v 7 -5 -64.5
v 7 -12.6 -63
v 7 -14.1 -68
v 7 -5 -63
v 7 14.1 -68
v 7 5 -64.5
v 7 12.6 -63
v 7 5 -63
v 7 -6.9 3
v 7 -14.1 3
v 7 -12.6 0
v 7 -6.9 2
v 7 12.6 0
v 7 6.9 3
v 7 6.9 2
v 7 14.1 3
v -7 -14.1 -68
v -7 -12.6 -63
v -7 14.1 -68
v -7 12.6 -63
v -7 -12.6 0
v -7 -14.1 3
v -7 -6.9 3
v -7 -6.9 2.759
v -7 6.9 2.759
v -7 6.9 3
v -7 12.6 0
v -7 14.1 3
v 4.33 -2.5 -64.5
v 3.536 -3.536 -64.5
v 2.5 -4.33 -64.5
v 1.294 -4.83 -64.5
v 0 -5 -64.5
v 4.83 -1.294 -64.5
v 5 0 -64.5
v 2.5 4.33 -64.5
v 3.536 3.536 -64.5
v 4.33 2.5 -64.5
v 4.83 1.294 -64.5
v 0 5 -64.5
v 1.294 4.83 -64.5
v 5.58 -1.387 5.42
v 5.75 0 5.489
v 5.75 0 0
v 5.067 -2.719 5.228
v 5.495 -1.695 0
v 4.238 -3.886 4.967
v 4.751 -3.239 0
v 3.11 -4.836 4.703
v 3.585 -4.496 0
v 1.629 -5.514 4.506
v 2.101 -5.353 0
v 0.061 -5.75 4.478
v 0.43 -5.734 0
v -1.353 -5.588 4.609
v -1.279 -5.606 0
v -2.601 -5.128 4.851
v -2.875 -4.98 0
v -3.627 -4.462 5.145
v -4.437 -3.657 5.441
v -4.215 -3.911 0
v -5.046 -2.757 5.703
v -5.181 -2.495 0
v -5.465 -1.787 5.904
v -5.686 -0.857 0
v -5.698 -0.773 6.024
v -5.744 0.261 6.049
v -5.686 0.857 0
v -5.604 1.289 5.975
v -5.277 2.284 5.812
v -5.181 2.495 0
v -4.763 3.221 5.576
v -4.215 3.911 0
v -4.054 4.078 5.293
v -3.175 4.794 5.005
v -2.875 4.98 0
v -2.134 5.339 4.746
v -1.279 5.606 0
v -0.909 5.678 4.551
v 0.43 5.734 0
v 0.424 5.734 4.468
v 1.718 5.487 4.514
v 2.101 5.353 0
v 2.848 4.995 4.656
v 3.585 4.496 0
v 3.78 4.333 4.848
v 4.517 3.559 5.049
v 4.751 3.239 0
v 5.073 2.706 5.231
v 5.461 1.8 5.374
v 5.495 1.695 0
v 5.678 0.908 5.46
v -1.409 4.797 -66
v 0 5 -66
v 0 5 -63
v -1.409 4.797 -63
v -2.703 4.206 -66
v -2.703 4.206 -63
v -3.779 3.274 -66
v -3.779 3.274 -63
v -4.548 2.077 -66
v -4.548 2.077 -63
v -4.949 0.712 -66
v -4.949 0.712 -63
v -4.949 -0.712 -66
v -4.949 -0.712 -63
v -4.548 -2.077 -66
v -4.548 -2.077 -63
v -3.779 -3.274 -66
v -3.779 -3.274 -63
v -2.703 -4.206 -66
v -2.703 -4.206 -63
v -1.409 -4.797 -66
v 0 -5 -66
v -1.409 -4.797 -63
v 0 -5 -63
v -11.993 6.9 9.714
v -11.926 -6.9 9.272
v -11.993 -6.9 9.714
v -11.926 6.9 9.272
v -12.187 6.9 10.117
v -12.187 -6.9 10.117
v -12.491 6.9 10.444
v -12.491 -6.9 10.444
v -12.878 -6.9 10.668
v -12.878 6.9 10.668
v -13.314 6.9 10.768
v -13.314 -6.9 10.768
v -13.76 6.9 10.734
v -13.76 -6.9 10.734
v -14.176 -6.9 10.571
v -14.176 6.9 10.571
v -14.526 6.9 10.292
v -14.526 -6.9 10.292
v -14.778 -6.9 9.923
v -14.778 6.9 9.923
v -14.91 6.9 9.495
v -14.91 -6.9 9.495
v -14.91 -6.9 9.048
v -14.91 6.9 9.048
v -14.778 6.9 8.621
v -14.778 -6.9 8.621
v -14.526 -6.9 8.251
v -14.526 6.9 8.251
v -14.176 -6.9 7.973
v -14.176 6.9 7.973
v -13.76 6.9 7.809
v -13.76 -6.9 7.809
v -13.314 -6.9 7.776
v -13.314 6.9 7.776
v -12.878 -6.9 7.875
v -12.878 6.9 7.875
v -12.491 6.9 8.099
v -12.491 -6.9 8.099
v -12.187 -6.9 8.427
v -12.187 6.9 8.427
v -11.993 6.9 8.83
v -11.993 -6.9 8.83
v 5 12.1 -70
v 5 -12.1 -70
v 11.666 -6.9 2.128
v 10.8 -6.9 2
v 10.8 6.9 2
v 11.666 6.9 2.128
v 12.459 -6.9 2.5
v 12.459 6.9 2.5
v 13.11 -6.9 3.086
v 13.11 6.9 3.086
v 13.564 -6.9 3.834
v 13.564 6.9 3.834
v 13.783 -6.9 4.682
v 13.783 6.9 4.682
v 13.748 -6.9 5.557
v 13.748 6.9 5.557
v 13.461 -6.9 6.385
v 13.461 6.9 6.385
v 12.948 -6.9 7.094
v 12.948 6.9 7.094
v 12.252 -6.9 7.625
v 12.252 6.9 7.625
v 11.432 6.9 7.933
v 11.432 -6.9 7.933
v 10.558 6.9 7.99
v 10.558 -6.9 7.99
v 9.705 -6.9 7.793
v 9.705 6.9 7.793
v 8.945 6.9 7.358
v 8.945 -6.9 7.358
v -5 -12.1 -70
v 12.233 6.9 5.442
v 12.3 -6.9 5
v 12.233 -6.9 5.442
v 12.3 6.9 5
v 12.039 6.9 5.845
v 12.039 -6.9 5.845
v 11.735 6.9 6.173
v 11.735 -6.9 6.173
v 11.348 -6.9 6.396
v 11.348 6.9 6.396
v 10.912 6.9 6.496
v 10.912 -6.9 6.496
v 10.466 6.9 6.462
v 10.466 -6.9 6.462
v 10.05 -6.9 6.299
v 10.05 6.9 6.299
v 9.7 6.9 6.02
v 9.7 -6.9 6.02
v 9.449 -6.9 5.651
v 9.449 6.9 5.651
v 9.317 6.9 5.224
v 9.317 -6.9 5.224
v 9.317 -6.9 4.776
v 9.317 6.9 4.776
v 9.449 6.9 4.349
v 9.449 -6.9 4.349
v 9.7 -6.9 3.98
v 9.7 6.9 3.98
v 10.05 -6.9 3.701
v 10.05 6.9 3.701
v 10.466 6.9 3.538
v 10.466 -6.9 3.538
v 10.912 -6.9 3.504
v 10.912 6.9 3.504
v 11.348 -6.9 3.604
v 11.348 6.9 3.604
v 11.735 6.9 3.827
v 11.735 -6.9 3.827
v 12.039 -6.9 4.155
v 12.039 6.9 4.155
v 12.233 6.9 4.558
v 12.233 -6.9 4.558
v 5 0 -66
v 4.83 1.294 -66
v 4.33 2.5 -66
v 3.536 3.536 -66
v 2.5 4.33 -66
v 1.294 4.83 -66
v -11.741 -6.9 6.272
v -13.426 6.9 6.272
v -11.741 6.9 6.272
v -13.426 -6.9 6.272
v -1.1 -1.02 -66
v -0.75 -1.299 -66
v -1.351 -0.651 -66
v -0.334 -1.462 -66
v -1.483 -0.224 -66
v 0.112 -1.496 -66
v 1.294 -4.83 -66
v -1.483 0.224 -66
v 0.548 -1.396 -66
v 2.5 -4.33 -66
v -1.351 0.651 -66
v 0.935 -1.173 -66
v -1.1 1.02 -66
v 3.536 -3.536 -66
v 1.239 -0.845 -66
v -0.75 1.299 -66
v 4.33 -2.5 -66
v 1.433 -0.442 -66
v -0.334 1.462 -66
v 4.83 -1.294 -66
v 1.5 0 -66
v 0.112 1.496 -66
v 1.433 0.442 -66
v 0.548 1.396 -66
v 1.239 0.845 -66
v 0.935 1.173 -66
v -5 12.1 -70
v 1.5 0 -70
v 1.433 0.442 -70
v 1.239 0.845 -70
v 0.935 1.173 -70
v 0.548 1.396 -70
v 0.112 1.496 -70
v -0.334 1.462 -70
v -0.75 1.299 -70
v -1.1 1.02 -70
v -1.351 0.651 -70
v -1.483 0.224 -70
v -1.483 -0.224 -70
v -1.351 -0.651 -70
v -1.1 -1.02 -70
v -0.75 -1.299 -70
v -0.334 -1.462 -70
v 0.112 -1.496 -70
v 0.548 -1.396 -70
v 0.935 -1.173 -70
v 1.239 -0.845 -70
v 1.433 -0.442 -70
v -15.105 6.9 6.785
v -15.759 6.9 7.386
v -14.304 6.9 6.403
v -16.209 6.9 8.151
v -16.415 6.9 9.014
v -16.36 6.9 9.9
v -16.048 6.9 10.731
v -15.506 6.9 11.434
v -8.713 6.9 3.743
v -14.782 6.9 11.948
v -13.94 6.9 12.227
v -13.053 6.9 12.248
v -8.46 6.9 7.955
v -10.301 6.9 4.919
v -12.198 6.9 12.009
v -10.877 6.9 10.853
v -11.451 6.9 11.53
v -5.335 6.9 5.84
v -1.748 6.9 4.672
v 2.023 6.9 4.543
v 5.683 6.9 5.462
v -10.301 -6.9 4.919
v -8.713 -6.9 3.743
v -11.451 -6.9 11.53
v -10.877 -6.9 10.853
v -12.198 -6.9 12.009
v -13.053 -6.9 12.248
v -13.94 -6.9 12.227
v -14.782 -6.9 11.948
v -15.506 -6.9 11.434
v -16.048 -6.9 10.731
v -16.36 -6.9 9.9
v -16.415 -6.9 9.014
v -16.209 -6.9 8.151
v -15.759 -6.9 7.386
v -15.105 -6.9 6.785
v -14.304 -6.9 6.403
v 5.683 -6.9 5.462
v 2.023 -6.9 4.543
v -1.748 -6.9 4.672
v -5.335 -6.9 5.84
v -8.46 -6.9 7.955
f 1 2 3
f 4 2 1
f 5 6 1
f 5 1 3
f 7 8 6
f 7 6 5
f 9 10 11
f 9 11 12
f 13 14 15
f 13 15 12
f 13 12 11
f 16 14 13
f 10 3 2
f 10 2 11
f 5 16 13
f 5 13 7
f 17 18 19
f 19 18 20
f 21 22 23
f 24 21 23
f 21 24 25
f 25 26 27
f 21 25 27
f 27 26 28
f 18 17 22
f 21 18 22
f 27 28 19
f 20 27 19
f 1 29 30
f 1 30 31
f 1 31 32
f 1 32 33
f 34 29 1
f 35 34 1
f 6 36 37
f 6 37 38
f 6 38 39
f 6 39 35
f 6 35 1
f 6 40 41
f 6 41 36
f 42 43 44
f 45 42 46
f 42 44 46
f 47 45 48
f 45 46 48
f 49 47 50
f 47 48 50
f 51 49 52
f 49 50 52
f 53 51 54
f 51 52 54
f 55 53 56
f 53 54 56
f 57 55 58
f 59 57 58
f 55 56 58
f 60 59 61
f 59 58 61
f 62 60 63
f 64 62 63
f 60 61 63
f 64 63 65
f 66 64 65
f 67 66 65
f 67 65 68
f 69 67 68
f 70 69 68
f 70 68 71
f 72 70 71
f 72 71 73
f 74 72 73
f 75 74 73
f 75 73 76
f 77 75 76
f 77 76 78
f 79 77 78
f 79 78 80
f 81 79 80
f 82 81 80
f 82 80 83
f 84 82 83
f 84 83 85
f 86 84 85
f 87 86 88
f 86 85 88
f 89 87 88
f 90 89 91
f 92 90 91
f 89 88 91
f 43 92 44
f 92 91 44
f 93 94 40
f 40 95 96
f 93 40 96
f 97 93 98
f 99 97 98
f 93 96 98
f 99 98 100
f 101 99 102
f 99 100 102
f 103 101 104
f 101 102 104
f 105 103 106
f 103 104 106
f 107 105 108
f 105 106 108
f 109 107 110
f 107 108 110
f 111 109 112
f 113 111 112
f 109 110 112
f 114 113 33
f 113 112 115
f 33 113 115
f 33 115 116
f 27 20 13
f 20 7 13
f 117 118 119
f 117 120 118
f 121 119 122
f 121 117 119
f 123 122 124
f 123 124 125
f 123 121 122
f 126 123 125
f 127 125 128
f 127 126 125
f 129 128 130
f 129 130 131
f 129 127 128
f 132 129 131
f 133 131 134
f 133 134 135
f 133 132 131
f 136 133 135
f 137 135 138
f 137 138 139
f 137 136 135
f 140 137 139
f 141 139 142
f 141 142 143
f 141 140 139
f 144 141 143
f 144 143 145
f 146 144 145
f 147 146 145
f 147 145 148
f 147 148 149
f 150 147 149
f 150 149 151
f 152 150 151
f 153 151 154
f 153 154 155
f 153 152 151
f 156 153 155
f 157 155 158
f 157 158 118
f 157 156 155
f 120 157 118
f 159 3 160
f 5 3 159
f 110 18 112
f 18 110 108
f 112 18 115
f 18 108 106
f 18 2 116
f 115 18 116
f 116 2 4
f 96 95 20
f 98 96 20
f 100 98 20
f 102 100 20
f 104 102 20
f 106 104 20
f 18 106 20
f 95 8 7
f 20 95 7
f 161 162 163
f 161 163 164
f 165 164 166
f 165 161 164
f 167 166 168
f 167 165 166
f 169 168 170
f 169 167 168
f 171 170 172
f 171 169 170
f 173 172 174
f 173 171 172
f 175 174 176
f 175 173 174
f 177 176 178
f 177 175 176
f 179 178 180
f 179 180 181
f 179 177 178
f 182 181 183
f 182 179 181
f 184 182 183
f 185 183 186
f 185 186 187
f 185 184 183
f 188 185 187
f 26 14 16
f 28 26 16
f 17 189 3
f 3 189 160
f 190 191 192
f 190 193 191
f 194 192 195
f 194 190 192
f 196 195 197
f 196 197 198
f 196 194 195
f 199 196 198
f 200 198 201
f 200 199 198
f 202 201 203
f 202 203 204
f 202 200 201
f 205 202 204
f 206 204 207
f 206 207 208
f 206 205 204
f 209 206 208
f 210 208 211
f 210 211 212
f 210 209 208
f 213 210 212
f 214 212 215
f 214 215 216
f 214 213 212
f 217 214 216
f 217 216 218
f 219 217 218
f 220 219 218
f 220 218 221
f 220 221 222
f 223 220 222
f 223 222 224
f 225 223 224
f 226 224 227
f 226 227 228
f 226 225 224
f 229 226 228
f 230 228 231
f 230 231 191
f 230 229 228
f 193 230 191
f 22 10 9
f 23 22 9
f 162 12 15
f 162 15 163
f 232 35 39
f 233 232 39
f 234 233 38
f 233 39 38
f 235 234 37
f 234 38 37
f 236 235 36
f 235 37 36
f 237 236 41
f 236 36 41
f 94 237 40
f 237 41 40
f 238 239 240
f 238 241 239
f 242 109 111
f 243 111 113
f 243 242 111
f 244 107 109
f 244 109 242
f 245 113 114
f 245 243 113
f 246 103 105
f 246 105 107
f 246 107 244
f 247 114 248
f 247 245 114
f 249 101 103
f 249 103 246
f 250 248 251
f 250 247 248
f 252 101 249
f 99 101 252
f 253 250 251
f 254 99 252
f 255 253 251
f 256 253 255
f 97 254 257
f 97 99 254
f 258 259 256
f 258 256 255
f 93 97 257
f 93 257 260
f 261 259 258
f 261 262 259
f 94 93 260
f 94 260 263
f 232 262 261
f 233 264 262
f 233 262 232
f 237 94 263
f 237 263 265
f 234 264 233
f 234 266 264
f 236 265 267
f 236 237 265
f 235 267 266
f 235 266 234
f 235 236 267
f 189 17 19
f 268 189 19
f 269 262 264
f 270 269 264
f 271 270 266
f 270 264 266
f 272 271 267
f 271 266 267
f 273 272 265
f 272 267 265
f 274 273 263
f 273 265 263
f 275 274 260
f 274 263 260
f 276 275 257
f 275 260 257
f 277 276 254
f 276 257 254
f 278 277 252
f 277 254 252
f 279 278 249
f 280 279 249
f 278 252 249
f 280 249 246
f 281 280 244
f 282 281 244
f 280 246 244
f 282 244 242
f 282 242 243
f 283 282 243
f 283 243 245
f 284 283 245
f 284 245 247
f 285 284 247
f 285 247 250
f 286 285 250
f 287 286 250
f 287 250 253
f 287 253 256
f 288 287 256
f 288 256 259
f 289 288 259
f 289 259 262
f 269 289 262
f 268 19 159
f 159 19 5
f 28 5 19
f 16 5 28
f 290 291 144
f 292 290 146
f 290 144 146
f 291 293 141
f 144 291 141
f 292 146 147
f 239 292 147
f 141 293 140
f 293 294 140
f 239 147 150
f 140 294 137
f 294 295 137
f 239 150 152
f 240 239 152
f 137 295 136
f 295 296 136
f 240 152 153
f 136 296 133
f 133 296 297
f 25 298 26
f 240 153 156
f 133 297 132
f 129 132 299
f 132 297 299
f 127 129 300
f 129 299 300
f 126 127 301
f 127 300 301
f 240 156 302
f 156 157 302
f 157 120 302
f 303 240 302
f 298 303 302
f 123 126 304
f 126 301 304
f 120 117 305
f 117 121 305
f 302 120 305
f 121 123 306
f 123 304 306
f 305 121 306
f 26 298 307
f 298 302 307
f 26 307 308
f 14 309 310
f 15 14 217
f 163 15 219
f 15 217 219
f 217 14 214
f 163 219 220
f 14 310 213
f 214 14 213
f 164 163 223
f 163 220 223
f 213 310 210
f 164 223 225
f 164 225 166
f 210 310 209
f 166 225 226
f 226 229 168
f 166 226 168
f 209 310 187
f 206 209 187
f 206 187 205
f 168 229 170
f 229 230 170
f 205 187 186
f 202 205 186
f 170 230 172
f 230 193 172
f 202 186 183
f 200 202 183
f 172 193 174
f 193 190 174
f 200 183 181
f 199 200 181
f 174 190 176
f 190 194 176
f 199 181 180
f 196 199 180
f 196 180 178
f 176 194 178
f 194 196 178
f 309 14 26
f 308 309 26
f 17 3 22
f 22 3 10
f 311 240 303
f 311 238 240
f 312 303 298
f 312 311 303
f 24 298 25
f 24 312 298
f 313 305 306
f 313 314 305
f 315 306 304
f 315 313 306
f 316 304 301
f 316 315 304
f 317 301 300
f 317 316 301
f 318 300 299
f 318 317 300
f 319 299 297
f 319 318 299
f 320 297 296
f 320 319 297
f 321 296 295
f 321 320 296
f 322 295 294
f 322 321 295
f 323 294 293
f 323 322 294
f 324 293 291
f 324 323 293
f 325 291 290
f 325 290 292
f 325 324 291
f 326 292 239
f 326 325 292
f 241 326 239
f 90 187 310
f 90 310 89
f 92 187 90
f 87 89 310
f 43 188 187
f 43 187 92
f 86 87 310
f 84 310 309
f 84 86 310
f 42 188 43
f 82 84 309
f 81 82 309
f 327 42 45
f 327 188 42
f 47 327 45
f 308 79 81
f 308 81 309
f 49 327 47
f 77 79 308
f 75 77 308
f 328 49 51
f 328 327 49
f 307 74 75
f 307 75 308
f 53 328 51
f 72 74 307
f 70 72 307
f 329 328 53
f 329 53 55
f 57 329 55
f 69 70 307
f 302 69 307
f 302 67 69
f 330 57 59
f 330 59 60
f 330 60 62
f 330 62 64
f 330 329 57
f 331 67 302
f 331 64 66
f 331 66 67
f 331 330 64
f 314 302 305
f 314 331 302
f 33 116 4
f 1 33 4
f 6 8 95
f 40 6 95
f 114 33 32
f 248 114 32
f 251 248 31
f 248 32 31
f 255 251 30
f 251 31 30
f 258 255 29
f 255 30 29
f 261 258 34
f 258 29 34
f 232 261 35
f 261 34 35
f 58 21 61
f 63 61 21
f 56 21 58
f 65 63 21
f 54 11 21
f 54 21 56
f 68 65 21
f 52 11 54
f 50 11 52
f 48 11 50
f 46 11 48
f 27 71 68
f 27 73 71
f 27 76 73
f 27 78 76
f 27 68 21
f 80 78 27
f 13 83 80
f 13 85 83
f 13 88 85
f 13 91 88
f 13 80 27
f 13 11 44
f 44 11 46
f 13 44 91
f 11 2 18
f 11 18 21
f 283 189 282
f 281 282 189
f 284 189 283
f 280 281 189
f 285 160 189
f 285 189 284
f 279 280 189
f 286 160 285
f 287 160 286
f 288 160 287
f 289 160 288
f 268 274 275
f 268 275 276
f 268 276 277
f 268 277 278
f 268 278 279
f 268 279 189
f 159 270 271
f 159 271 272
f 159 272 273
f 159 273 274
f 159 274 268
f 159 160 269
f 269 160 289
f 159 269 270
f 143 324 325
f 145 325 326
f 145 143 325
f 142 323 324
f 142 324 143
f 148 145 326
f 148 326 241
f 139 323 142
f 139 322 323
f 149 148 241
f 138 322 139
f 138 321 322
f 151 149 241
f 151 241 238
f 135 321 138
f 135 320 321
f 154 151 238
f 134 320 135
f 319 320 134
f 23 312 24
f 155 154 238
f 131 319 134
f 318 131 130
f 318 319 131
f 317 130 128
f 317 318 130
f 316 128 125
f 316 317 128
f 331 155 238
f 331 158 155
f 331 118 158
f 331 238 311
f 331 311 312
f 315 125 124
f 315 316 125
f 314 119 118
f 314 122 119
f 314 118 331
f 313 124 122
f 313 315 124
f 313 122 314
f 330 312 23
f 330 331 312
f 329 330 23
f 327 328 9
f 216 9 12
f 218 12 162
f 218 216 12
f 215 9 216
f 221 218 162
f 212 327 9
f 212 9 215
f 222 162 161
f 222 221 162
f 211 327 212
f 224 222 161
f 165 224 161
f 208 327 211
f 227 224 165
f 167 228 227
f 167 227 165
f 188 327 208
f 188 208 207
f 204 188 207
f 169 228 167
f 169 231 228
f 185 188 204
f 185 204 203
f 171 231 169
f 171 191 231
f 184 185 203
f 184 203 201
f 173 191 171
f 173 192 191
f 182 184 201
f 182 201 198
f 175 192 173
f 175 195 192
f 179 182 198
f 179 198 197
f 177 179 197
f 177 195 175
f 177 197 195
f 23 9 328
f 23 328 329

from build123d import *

# Parameters (mm, degrees)
F0_R      = 1.5
F1_DEPTH  = 6.9
F2_W      = 28.2
F2_H      = 73
F2_W_2    = 25.2
F2_H_2    = 63
F3_DEPTH  = 7
F4_R      = 5.75
F5_DEPTH  = 12.2727451706
F6_SIZE   = 2
F7_R      = 1.5
F8_DEPTH  = 3
F9_DEPTH  = 7.001
F10_DEPTH = 1.5


with BuildPart() as f1:
    # F0 (on Front) → F1 (new body, symmetric)
    with BuildSketch(Plane.XZ):
        with BuildLine():
            Line((-7, 2.7587302293), (-7, 0))
            Line((-7, 0), (7, 0))
            Line((7, 0), (7, 2))
            Line((7, 2), (10.8, 2))
            ThreePointArc((10.8, 2), (13.6348625345, 5.9816080739), (8.9448506986, 7.3576303929))
            ThreePointArc((8.9448506986, 7.3576303929), (-1.7475715563, 4.6720624952), (-10.8766435302, 10.8526946234))
            ThreePointArc((-10.8766435302, 10.8526946234), (-16.0476108736, 10.7307091252), (-13.4262707241, 6.2717451706))
            Line((-13.4262707241, 6.2717451706), (-11.7411403572, 6.2717451706))
            ThreePointArc((-11.7411403572, 6.2717451706), (-9.5241596378, 4.3079544417), (-7, 2.7587302293))
        make_face()
        with Locations((10.8, 5)):
            Circle(F0_R, mode=Mode.SUBTRACT)
        with Locations((-13.4262707241, 9.2717451706)):
            Circle(F0_R, mode=Mode.SUBTRACT)
    extrude(amount=F1_DEPTH, both=True)

    # F2 (on Right) → F3 (join, symmetric)
    with BuildSketch(Plane.YZ):
        with Locations((0, -33.5)):
            Rectangle(F2_W, F2_H)
        with Locations((0, -31.5)):
            Rectangle(F2_W_2, F2_H_2, mode=Mode.SUBTRACT)
    extrude(amount=F3_DEPTH, both=True)

    # F4 (on face) → F5 (cut, through all)
    with BuildSketch(Plane(origin=(0, 0, 0), x_dir=(1, 0, 0), z_dir=(0, 0, -1))):
        Circle(F4_R)
    extrude(amount=-F5_DEPTH, mode=Mode.SUBTRACT)

    # F6
    f6_edges = [f1.edges().sort_by_distance(p)[0] for p in [
        (0, -14.1, -70),
        (-7, 0, -70),
        (0, 14.1, -70),
        (7, 0, -70),
    ]]
    chamfer(f6_edges, length=F6_SIZE)

    # F7 (on face) → F8 (cut)
    with BuildSketch(Plane.XY.offset(-63)):
        with BuildLine():
            ThreePointArc((0, -5), (3.5355339059, -3.5355339059), (5, 0))
            ThreePointArc((5, 0), (3.5355339059, 3.5355339059), (0, 5))
            ThreePointArc((0, 5), (-5, 0), (0, -5))
        make_face()
        Circle(F7_R, mode=Mode.SUBTRACT)
    extrude(amount=-F8_DEPTH, mode=Mode.SUBTRACT)

    # F9 (cut, through all): a face of the model
    f9_faces = [f1.faces().sort_by_distance(p)[0] for p in [
        (0, 0, -63),
    ]]
    extrude(f9_faces, amount=-F9_DEPTH, mode=Mode.SUBTRACT)

    # F7 (on face) → F10 (cut)
    with BuildSketch(Plane.XY.offset(-63)):
        with BuildLine():
            ThreePointArc((0, 5), (3.5355339059, 3.5355339059), (5, 0))
            ThreePointArc((5, 0), (3.5355339059, -3.5355339059), (0, -5))
            Line((0, -5), (7, -5))
            Line((7, -5), (7, 5))
            Line((7, 5), (0, 5))
        make_face()
    extrude(amount=-F10_DEPTH, mode=Mode.SUBTRACT)


solid = f1.part
